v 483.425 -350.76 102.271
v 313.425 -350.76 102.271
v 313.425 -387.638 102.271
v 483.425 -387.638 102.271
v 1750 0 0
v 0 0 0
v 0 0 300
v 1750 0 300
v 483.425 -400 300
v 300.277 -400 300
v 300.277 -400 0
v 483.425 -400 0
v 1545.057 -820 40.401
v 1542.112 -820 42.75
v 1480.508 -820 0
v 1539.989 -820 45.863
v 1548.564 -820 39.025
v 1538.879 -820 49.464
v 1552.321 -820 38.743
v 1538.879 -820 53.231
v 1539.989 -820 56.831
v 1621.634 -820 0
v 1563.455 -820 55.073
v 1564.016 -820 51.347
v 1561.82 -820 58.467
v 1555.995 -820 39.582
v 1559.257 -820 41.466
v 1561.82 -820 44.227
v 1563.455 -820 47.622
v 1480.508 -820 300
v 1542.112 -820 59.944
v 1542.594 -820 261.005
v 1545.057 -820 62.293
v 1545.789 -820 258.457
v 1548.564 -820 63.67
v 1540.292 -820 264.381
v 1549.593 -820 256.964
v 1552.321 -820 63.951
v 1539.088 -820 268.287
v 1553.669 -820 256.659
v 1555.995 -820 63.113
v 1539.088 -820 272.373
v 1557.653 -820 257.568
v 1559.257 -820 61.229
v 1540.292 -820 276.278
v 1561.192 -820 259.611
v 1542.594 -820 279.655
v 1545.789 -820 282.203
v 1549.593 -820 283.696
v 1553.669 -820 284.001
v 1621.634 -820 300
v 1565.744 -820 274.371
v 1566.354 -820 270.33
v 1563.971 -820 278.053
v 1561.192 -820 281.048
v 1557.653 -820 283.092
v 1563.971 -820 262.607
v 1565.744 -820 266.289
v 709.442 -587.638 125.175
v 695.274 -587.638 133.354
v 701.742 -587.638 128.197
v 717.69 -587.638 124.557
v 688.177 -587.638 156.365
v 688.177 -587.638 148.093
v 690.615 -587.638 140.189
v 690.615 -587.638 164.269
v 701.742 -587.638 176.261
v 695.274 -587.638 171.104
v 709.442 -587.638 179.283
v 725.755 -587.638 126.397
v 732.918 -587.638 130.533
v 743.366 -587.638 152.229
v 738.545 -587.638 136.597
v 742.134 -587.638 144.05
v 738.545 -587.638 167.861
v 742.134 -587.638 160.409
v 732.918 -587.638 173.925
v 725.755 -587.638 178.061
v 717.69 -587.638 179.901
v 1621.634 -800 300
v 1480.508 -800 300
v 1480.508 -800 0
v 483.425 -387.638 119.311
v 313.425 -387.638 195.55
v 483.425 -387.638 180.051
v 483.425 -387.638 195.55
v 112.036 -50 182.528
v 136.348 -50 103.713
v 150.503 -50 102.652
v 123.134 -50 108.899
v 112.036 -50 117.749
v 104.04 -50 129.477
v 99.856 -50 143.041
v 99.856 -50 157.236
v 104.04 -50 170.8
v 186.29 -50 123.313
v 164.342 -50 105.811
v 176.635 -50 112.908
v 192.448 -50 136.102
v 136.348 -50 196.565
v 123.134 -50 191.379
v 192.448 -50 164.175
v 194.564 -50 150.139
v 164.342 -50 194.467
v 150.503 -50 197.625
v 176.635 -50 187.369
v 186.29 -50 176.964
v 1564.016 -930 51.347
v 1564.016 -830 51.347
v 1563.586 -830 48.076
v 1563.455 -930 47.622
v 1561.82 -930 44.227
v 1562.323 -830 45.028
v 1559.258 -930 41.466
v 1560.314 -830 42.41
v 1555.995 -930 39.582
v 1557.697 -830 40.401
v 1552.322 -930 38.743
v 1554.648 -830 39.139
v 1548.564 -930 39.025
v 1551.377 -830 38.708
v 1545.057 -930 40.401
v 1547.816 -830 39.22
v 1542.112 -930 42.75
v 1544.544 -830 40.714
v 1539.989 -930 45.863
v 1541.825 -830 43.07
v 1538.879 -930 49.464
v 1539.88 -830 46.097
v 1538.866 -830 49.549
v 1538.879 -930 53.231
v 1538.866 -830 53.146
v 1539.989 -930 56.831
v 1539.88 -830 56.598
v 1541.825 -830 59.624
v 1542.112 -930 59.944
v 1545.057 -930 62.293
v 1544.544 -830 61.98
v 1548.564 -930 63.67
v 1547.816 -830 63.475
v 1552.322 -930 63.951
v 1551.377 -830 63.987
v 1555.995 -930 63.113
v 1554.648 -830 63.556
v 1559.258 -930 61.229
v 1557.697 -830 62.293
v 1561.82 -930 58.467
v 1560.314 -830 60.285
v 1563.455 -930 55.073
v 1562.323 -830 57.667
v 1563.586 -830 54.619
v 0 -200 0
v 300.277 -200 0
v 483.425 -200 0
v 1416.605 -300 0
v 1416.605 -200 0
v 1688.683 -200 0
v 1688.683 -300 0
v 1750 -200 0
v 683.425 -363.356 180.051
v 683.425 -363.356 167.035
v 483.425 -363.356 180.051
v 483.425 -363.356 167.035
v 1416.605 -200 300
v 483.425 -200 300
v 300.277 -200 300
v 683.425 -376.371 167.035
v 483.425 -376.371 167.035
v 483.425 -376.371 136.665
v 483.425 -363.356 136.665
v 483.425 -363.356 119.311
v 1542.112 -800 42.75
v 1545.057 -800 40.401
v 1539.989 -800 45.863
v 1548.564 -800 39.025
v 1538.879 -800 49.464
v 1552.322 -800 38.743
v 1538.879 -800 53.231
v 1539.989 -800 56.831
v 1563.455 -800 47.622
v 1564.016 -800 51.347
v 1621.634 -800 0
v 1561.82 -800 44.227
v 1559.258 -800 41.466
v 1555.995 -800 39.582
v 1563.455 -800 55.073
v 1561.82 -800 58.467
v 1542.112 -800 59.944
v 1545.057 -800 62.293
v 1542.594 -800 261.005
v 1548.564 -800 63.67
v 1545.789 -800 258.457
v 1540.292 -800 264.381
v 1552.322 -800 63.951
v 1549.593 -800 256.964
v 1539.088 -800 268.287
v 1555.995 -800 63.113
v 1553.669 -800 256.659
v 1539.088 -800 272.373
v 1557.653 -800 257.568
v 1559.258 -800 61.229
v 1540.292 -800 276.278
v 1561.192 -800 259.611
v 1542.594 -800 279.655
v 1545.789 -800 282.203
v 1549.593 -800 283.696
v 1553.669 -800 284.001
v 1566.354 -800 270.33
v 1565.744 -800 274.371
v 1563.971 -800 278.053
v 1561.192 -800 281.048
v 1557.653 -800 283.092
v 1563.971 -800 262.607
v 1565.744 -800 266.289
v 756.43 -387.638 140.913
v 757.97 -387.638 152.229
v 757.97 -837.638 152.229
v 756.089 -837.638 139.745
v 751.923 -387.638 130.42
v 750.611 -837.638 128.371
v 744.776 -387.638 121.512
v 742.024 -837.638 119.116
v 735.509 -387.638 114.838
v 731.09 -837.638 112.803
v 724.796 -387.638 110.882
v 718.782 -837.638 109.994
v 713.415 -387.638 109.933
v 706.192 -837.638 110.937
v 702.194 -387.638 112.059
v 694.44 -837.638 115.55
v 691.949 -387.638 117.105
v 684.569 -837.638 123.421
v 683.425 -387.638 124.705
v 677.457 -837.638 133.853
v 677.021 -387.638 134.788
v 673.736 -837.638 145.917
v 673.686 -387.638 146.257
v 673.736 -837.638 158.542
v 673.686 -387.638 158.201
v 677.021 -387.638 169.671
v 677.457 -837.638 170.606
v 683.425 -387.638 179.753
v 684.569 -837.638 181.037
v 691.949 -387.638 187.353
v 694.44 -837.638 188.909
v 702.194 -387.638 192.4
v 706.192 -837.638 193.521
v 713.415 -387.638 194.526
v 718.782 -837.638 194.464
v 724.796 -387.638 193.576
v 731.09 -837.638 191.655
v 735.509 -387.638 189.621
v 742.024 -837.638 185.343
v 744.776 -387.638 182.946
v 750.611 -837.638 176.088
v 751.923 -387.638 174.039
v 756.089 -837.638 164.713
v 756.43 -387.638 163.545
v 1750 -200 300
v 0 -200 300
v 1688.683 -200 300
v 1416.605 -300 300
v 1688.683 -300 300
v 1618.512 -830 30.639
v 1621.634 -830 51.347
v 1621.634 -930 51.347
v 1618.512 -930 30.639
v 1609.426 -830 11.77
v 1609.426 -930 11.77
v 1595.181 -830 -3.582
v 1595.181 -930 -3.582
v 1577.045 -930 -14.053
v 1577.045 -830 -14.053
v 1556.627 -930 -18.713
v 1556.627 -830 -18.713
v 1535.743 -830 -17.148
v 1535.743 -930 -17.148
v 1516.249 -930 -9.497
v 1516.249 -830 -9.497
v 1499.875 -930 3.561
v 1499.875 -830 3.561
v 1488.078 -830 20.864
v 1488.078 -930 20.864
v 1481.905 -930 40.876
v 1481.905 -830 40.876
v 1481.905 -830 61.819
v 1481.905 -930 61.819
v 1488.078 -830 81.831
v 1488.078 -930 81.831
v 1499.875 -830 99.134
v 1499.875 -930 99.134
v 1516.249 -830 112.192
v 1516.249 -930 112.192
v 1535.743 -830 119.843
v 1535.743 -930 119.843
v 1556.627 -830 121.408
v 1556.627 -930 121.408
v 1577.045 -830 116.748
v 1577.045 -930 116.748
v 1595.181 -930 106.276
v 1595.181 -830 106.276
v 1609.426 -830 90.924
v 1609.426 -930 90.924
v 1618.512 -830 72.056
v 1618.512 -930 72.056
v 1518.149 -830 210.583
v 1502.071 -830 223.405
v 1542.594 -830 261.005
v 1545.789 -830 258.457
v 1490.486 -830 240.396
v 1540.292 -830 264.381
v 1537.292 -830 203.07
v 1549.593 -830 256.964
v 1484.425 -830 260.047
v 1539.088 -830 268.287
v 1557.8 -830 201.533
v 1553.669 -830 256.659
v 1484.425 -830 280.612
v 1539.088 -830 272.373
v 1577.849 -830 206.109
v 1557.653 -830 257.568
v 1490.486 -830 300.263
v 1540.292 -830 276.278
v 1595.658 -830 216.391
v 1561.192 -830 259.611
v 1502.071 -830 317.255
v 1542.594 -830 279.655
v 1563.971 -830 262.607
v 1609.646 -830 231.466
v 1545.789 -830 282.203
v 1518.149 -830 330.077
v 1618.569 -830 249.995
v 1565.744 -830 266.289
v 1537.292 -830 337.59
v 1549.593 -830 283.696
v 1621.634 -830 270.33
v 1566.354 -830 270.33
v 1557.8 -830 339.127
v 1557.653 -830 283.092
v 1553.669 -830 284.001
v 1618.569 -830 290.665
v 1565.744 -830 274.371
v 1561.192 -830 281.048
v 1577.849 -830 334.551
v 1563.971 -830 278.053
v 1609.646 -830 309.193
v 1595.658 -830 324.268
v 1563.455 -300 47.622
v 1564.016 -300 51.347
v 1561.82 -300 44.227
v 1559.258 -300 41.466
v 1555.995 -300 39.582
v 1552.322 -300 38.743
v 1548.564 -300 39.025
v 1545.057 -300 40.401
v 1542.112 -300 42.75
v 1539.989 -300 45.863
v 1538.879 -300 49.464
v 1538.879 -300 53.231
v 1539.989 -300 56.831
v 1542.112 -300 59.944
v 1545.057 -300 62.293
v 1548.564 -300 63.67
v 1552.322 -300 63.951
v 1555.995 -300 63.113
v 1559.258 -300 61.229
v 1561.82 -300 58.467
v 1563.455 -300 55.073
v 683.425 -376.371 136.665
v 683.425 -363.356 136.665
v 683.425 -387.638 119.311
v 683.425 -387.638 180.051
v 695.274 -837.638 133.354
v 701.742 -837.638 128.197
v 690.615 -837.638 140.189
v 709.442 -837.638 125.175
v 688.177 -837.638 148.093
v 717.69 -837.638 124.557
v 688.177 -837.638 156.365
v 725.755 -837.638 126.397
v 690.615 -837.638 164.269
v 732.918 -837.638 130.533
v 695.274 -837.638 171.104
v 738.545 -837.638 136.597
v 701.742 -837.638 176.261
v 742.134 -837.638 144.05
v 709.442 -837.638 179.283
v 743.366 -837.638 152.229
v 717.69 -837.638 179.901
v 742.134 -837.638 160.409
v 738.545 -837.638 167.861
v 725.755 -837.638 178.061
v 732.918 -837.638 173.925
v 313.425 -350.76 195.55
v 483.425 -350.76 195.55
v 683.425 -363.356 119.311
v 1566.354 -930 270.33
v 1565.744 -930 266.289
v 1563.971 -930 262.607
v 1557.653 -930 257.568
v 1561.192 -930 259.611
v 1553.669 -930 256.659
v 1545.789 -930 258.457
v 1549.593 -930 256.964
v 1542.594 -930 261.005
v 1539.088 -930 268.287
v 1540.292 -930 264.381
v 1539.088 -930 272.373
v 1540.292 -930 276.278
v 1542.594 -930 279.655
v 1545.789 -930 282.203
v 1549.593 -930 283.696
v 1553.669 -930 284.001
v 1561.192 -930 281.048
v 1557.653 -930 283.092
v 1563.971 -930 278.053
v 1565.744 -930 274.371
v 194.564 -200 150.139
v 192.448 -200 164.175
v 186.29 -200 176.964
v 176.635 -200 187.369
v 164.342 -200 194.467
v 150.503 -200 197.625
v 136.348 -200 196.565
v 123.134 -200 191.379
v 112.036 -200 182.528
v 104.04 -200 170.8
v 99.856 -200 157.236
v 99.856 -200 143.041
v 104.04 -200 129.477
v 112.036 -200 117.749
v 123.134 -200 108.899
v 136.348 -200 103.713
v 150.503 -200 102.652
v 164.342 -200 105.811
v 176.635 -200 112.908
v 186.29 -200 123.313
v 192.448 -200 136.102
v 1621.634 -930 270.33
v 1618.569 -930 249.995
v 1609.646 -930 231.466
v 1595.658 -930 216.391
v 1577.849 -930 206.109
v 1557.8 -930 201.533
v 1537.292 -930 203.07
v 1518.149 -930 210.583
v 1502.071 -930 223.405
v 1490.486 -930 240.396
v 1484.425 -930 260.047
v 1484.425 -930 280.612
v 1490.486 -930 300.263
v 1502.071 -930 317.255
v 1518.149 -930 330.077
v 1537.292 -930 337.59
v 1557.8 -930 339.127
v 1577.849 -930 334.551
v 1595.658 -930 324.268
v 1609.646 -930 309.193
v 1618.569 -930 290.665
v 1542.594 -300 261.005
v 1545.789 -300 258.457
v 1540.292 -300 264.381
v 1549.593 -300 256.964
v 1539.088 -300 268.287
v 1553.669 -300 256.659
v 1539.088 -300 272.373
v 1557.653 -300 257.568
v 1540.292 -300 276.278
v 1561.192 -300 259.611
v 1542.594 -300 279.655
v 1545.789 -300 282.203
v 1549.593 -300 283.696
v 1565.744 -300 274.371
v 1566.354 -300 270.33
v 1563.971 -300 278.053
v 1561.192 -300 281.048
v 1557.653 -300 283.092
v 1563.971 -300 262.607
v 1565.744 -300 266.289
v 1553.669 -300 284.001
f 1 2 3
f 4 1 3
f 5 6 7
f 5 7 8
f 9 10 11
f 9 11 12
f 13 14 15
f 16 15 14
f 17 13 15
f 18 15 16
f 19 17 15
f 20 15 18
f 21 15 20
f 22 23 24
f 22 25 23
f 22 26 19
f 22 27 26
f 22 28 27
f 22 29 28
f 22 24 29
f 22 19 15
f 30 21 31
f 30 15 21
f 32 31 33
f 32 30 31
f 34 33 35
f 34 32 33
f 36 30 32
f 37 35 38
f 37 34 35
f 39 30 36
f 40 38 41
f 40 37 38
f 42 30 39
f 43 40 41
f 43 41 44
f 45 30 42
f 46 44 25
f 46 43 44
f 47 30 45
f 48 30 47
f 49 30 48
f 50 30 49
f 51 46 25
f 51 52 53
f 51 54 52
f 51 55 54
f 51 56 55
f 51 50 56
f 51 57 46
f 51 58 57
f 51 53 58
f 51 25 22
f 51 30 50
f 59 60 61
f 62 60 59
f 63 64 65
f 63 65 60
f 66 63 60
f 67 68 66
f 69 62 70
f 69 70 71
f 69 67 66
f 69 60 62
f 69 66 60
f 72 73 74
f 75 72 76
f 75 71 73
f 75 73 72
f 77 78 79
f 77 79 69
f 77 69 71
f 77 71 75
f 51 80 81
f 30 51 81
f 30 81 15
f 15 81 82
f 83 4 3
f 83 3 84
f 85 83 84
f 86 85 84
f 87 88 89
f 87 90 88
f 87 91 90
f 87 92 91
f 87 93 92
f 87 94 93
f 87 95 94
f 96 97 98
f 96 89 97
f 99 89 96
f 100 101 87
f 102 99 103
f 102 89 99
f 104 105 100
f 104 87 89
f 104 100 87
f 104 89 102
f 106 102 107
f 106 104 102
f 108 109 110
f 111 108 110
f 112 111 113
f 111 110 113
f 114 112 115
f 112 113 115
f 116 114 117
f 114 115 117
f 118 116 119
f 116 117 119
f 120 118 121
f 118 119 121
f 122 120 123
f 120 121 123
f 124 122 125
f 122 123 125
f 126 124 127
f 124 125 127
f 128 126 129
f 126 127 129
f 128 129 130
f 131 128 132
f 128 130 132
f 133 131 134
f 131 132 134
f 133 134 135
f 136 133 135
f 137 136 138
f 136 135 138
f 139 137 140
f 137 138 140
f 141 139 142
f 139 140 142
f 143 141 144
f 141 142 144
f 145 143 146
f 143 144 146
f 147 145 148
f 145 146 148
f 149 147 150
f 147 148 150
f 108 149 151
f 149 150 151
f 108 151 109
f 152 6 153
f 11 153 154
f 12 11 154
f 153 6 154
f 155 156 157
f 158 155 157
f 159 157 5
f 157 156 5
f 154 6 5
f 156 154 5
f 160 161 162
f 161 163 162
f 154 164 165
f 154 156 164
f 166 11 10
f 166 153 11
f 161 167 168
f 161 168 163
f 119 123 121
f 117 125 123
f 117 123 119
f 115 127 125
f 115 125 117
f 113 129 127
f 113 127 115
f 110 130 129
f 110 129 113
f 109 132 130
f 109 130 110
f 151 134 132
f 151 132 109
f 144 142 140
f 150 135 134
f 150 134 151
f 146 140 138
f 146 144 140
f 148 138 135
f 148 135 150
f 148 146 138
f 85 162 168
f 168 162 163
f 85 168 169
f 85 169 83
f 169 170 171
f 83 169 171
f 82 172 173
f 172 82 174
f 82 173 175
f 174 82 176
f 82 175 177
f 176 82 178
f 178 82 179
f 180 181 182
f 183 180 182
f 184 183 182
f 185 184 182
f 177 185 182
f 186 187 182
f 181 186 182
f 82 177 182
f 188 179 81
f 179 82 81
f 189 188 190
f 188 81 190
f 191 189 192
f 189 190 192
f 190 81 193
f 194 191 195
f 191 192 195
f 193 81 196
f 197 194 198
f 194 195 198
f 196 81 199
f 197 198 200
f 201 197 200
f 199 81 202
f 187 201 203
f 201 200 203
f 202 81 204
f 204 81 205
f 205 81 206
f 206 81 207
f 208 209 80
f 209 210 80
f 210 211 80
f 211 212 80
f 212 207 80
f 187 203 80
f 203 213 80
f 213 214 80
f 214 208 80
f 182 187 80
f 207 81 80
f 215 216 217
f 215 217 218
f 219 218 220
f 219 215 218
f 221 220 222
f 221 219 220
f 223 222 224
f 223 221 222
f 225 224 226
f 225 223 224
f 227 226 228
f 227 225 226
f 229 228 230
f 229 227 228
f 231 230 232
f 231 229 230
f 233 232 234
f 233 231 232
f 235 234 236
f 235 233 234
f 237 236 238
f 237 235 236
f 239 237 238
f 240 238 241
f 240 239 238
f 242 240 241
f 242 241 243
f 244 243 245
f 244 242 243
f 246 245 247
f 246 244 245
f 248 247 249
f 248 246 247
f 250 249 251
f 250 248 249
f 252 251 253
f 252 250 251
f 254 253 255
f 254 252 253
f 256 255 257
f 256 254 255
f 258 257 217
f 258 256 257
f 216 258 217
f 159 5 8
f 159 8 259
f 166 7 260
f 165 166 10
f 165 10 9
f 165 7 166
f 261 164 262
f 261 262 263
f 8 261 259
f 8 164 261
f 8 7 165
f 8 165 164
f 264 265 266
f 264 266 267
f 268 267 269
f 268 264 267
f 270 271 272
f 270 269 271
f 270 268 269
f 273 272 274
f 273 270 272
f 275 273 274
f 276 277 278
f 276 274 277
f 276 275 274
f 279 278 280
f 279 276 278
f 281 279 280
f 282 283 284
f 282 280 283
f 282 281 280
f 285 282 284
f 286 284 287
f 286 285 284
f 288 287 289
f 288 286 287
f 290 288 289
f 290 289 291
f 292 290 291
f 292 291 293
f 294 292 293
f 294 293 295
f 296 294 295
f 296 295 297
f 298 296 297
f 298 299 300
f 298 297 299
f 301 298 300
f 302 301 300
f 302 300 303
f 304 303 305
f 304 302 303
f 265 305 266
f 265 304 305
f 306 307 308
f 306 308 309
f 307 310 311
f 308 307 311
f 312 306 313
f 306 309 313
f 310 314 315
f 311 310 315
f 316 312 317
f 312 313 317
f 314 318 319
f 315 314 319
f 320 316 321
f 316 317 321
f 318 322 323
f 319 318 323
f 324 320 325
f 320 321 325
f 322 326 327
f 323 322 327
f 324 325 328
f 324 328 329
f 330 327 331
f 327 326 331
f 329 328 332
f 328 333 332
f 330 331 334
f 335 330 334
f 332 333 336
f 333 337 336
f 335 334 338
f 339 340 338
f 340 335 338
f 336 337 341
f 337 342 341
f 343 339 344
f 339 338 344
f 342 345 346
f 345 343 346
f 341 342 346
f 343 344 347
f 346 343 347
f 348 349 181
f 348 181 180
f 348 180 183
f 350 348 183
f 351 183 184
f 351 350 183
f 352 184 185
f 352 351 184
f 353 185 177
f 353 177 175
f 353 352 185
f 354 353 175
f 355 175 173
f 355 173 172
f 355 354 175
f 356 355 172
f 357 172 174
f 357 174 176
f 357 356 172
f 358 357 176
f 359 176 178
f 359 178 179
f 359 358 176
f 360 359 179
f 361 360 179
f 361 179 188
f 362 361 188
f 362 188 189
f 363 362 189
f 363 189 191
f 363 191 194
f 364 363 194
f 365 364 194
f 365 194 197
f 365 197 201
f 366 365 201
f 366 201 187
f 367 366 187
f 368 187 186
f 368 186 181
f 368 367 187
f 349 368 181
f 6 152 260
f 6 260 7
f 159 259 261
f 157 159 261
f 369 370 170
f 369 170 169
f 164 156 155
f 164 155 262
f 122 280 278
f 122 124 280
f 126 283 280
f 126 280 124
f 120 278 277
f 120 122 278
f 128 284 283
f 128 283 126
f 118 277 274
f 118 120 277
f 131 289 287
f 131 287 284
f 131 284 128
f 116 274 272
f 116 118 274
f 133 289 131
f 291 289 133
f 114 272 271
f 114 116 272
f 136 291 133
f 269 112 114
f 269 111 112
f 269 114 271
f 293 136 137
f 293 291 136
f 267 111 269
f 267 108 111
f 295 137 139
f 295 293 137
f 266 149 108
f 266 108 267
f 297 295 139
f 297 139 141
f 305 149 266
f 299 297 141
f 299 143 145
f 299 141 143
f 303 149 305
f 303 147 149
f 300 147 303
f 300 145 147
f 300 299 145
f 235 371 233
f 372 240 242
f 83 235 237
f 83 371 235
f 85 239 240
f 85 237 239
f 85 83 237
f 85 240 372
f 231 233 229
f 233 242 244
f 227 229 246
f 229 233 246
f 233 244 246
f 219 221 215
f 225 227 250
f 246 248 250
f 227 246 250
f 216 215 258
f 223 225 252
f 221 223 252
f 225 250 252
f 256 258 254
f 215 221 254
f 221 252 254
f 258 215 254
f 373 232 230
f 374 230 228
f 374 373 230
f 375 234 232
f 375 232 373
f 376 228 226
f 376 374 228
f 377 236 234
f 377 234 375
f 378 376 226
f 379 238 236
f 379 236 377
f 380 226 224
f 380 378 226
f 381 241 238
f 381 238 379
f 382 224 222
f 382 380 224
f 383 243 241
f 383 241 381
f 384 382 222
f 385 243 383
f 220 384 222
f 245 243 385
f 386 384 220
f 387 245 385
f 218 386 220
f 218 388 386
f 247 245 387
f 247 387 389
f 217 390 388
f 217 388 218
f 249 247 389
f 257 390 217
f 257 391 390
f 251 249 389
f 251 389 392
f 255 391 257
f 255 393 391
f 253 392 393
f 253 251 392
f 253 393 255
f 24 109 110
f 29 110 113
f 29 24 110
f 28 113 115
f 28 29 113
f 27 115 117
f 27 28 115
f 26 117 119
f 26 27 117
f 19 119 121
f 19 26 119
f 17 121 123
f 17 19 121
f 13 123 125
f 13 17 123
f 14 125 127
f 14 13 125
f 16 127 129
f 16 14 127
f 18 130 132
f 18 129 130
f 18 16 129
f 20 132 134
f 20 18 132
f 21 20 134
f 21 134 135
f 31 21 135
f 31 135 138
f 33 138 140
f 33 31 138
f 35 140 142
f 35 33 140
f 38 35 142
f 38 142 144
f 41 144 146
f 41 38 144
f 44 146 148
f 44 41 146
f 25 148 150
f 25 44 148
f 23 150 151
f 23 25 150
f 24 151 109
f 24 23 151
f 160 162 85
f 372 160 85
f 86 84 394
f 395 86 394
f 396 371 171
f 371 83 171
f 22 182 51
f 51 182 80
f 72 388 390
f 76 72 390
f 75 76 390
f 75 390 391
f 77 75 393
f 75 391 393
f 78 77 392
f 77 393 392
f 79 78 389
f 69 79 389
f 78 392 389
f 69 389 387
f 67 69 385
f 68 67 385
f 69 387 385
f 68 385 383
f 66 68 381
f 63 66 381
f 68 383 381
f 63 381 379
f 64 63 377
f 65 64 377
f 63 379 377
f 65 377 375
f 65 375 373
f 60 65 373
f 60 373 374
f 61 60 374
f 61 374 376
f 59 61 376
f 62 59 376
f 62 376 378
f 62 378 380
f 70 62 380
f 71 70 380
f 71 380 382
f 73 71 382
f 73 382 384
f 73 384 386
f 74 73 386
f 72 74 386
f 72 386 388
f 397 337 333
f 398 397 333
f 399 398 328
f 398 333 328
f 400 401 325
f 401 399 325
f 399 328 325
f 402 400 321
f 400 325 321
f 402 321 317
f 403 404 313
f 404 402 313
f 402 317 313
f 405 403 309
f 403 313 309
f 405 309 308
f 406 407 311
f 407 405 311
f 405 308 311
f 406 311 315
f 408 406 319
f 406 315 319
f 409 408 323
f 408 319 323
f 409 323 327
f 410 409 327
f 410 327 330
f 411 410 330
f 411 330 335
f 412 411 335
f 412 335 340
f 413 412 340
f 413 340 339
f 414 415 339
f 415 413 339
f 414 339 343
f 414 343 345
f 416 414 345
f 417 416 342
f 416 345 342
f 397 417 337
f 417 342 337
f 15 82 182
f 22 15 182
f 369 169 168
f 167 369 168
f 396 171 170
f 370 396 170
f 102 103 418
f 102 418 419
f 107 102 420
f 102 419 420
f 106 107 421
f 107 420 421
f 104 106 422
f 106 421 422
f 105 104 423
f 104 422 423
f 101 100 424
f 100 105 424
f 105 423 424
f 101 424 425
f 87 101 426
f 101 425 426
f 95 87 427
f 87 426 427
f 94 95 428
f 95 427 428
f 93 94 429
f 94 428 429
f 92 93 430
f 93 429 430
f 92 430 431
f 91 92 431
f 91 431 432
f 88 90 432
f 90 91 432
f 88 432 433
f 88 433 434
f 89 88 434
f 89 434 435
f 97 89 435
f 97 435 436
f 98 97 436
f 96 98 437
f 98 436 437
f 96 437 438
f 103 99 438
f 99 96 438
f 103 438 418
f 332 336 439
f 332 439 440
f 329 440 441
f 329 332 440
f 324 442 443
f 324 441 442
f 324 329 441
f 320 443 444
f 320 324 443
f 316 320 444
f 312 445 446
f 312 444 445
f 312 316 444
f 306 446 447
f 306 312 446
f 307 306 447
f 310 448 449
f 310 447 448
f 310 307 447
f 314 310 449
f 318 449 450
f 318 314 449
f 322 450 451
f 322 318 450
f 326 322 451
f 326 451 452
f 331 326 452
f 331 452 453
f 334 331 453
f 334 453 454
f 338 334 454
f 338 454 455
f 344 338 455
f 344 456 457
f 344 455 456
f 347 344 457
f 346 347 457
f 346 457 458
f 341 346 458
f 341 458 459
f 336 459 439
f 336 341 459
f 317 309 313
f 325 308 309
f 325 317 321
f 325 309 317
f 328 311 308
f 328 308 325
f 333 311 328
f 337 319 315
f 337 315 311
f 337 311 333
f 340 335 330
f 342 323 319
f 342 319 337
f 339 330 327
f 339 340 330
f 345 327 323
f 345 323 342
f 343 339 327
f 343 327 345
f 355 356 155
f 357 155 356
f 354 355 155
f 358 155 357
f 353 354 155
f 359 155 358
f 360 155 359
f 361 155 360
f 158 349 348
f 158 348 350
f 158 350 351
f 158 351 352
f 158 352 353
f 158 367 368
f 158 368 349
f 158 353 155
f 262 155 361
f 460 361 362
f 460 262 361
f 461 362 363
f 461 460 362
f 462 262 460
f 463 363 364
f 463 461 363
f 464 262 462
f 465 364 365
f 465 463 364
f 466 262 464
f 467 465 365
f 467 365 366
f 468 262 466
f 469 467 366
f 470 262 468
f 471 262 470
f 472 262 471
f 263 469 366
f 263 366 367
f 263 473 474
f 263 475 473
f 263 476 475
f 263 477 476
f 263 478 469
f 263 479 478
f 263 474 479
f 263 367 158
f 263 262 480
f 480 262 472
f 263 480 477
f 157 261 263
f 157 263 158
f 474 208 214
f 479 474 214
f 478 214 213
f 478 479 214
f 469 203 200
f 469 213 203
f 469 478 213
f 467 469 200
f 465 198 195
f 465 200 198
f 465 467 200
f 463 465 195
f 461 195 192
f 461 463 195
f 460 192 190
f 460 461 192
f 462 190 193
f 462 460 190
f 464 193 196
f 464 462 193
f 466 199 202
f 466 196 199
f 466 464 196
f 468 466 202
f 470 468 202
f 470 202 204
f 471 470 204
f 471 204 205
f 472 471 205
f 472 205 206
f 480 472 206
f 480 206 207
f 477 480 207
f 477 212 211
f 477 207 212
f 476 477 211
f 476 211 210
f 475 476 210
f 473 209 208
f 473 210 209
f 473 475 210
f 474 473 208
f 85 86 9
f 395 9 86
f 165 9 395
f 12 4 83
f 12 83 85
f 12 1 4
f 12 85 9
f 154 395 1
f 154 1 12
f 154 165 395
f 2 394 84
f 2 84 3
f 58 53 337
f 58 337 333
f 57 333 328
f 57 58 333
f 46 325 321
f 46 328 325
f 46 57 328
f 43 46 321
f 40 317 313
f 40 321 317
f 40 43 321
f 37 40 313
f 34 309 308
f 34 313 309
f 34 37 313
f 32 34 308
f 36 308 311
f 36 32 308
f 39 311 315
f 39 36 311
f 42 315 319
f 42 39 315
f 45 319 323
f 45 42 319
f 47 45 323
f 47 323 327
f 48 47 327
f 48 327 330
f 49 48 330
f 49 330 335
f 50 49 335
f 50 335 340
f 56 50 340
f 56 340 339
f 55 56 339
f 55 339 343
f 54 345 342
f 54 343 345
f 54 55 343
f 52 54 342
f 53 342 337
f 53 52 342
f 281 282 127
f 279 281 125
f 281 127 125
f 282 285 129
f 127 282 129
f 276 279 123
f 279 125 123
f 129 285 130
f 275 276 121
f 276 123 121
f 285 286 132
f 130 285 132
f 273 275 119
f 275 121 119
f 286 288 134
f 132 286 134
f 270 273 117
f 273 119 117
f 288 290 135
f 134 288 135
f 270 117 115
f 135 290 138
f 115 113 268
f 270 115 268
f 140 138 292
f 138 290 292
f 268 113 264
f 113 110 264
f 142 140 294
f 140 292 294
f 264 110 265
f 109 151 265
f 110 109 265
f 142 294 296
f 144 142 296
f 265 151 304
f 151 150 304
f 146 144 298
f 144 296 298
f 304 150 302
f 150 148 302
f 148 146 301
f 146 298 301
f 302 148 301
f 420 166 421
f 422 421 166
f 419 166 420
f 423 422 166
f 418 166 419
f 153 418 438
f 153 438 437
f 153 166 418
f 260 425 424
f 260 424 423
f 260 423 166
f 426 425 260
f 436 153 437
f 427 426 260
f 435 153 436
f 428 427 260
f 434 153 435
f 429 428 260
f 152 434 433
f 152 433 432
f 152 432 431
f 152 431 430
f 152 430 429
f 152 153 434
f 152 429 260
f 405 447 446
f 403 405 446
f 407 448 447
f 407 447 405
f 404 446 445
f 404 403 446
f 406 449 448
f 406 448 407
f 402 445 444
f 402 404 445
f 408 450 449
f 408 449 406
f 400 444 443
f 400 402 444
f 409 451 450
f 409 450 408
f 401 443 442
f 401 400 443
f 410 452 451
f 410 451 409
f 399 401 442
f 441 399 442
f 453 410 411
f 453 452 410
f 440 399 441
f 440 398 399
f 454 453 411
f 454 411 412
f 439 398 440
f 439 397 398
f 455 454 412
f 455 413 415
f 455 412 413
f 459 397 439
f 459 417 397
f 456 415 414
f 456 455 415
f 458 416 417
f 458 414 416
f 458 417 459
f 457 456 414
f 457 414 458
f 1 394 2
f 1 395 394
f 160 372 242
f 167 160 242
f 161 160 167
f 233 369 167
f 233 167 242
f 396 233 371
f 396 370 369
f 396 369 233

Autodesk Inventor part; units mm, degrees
ref_plane "YZ Plane" through (0, 0, 0) normal (1, 0, 0) x (0, 1, 0)
ref_plane "XZ Plane" through (0, 0, 0) normal (0, 1, 0) x (-1, 0, 0)
ref_plane "XY Plane" through (0, 0, 0) normal (0, 0, 1) x (1, 0, 0)
sketch "Sketch1" plane through (0, 0, 0) normal (0, 0, 1) x (1, 0, 0)
  line L0 (0, 0) -> (1750, 0)
  line L1 (1750, 0) -> (1750, -200)
  line L2 (1750, -200) -> (0, -200)
  line L3 (0, -200) -> (0, 0)
  dimension "d0" = 1750
  dimension "d1" = 200
extrude "Extrusion1" add sketch "Sketch1" along normal blind 300
sketch "Sketch2" plane through (0, -200, 0) normal (0, -1, 0) x (1, 0, 0)
  line L0 (1750, 300) -> (0, 300) projected
  line L1 (146.9442, 300) -> (146.9442, 150.1387)
  circle A0 centre (146.9442, 150.1387) radius 66.1557
  point P0 (0, 0)
extrude "Extrusion2" add sketch "Sketch2" against normal blind 150
sketch "Sketch3" plane through (0, -200, 0) normal (0, -1, 0) x (1, 0, 0)
  line L0 (1750, 300) -> (0, 300) projected
  line L1 (146.9442, 300) -> (146.9442, 150.1387)
  circle A0 centre (146.9442, 150.1387) radius 47.6199
  point P0 (0, 0)
extrude "Extrusion3" cut sketch "Sketch3" against normal blind 150
sketch "Sketch4" plane through (0, -200, 0) normal (0, -1, 0) x (1, 0, 0)
  line L0 (0, 300) -> (1750, 300) projected
  line L1 (1750, 0) -> (0, 0) projected
  line L2 (300.2774, 300) -> (483.4253, 300)
  line L3 (483.4253, 300) -> (483.4253, 0)
  line L4 (483.4253, 0) -> (300.2774, 0)
  line L5 (300.2774, 0) -> (300.2774, 300)
extrude "Extrusion4" add sketch "Sketch4" along normal blind 200
sketch "Sketch5" plane through (483.4253, -200, 300) normal (1, 0, 0) x (0, 0, -1)
  point P0 (300, 200)
sketch "Sketch6" plane through (483.4253, -200, 300) normal (1, 0, 0) x (0, 0, -1)
  line L0 (104.45, -150.7604) -> (197.7293, -150.7604)
  line L1 (197.7293, -150.7604) -> (197.7293, -187.6383)
  line L2 (197.7293, -187.6383) -> (104.45, -187.6383)
  line L3 (104.45, -187.6383) -> (104.45, -150.7604)
  point P0 (300, 200)
extrude "Extrusion5" cut sketch "Sketch6" against normal blind 170
sketch "Sketch7" plane through (483.4253, -200, 300) normal (1, 0, 0) x (0, 0, -1)
  line L0 (197.7293, -187.6383) -> (104.45, -187.6383) projected
  line L1 (119.9492, -187.6383) -> (180.6892, -187.6383)
  line L2 (180.6892, -187.6383) -> (180.6892, -163.3555)
  line L3 (180.6892, -163.3555) -> (119.9492, -163.3555)
  line L4 (119.9492, -163.3555) -> (119.9492, -187.6383)
  point P0 (300, 200)
extrude "Extrusion6" add sketch "Sketch7" along normal blind 200
sketch "Sketch8" plane through (683.4253, -200, 300) normal (1, 0, 0) x (0, 0, -1)
  line L0 (180.6892, -163.3555) -> (119.9492, -163.3555) projected
  line L1 (132.9649, -163.3555) -> (163.3349, -163.3555)
  line L2 (163.3349, -163.3555) -> (163.3349, -176.3712)
  line L3 (163.3349, -176.3712) -> (132.9649, -176.3712)
  line L4 (132.9649, -176.3712) -> (132.9649, -163.3555)
  point P0 (300, 200)
extrude "Extrusion7" cut sketch "Sketch8" against normal blind 200
sketch "Sketch9" plane through (483.4253, -387.6383, 119.3108) normal (0, -1, 0) x (1, 0, 0)
  circle A0 centre (232.1912, 32.9184) radius 42.3537
  point P0 (-483.4253, -119.3108)
extrude "Extrusion8" add sketch "Sketch9" along normal blind 450
sketch "Sketch10" plane through (715.6165, -837.6383, 152.2291) normal (0, -1, 0) x (1, 0, 0)
  circle A0 centre (0, 0) radius 27.7499
  point P0 (-715.6165, -152.2291)
extrude "Extrusion9" cut sketch "Sketch10" against normal blind 250
sketch "Sketch11" plane through (1750, -200, 0) normal (0, -1, 0) x (1, 0, 0)
  line L0 (-1266.5747, 300) -> (0, 300) projected
  line L1 (-333.395, 300) -> (-61.3169, 300)
  line L2 (-61.3169, 300) -> (-61.3169, 0)
  line L3 (-61.3169, 0) -> (-333.395, 0)
  line L4 (-333.395, 0) -> (-333.395, 300)
  point P0 (-1750, 0)
extrude "Extrusion10" add sketch "Sketch11" along normal blind 100
sketch "Sketch12" plane through (1750, -300, 0) normal (0, -1, 0) x (1, 0, 0)
  line L0 (0, 300) -> (-1750, 300) projected
  line L1 (-198.623, 300) -> (-198.623, 250.4175)
  line L2 (-1750, 0) -> (0, 0) projected
  line L3 (-198.623, 0) -> (-198.623, 51.3474)
  circle A0 centre (-198.623, 250.4175) radius 12.6394
  circle A1 centre (-198.623, 51.3474) radius 12.6394
extrude "Extrusion11" add sketch "Sketch12" along normal blind 500 contours A1
sketch "Sketch13" plane through (1750, -300, 0) normal (0, -1, 0) x (1, 0, 0)
  circle A0 centre (-197.356, 270.3298) radius 13.7095
  point P0 (-1750, 0)
extrude "Extrusion12" add sketch "Sketch13" along normal blind 500
sketch "Sketch14" plane through (1552.644, -800, 270.3298) normal (0, -1, 0) x (1, 0, 0)
  line L0 (197.356, 29.6702) -> (-1552.644, 29.6702) projected
  line L1 (-1552.644, -270.3298) -> (197.356, -270.3298) projected
  line L2 (68.9898, 29.6702) -> (-72.1361, 29.6702)
  line L3 (-72.1361, 29.6702) -> (-72.1361, -270.3298)
  line L4 (-72.1361, -270.3298) -> (68.9898, -270.3298)
  line L5 (68.9898, -270.3298) -> (68.9898, 29.6702)
extrude "Extrusion13" add sketch "Sketch14" along normal blind 20
sketch "Sketch15" plane through (1552.644, -820, 270.3298) normal (0, -1, 0) x (1, 0, 0)
  circle A0 centre (0, 0) radius 13.7095 projected
  circle A1 centre (0, 0) radius 13.7095
  circle A2 centre (-1.2671, -218.9824) radius 12.6394 projected
  circle A3 centre (-1.2671, -218.9824) radius 12.6394
  point P0 (-1552.644, -270.3298)
extrude "Extrusion14" add sketch "Sketch15" along normal blind 10 contours A2
sketch "Sketch16" plane through (1552.644, -820, 270.3298) normal (0, -1, 0) x (1, 0, 0)
  circle A0 centre (0, 0) radius 13.7095 projected
  circle A1 centre (0, 0) radius 13.7095
  point P0 (-1552.644, -270.3298)
extrude "Extrusion15" add sketch "Sketch16" along normal blind 10
sketch "Sketch17" plane through (1552.644, -830, 270.3298) normal (0, -1, 0) x (1, 0, 0)
  circle A0 centre (0, 0) radius 13.7095 projected
  circle A1 centre (0, 0) radius 68.9898
  line L0 (68.9898, -270.3298) -> (68.9898, 29.6702) projected
  circle A2 centre (-1.2671, -218.9824) radius 12.6394 projected
  circle A3 centre (-1.2671, -218.9824) radius 70.2568
  point P0 (-1552.644, -270.3298)
extrude "Extrusion16" add sketch "Sketch17" along normal blind 100 contours A1
sketch "Sketch18" plane through (1551.377, -830, 51.3474) normal (0, -1, 0) x (1, 0, 0)
  circle A0 centre (0, 0) radius 12.6394 projected
  circle A1 centre (0, 0) radius 70.2568
  line L0 (70.2568, -51.3474) -> (70.2568, 248.6526) projected
  point P0 (-1551.377, -51.3474)
extrude "Extrusion17" add sketch "Sketch18" along normal blind 100
thread "Thread1" size "M140x8" class "6g" standard "ANSI Metric M Profile" full length
thread "Thread2" size "M145x6" class "6g" standard "ANSI Metric M Profile" full length
thread "Thread3" size "M56x6.5" class "6H" standard "ANSI Metric M Profile" full length
equation "\"BendRadius\" = Thickness"
equation "\"BendReliefWidth\" = Thickness"
equation "\"BendReliefDepth\" = 0.5 * Thickness"
equation "\"CornerReliefSize\" = 4 * Thickness"
equation "\"MinimumRemnant\" = 2 * Thickness"
equation "\"TransitionRadius\" = BendRadius"
equation "\"JacobiRadiusSize\" = BendRadius"
equation "\"GapSize\" = Thickness"
equation "\"Thickness\" = 3.048"
properties part number "new part ee"
